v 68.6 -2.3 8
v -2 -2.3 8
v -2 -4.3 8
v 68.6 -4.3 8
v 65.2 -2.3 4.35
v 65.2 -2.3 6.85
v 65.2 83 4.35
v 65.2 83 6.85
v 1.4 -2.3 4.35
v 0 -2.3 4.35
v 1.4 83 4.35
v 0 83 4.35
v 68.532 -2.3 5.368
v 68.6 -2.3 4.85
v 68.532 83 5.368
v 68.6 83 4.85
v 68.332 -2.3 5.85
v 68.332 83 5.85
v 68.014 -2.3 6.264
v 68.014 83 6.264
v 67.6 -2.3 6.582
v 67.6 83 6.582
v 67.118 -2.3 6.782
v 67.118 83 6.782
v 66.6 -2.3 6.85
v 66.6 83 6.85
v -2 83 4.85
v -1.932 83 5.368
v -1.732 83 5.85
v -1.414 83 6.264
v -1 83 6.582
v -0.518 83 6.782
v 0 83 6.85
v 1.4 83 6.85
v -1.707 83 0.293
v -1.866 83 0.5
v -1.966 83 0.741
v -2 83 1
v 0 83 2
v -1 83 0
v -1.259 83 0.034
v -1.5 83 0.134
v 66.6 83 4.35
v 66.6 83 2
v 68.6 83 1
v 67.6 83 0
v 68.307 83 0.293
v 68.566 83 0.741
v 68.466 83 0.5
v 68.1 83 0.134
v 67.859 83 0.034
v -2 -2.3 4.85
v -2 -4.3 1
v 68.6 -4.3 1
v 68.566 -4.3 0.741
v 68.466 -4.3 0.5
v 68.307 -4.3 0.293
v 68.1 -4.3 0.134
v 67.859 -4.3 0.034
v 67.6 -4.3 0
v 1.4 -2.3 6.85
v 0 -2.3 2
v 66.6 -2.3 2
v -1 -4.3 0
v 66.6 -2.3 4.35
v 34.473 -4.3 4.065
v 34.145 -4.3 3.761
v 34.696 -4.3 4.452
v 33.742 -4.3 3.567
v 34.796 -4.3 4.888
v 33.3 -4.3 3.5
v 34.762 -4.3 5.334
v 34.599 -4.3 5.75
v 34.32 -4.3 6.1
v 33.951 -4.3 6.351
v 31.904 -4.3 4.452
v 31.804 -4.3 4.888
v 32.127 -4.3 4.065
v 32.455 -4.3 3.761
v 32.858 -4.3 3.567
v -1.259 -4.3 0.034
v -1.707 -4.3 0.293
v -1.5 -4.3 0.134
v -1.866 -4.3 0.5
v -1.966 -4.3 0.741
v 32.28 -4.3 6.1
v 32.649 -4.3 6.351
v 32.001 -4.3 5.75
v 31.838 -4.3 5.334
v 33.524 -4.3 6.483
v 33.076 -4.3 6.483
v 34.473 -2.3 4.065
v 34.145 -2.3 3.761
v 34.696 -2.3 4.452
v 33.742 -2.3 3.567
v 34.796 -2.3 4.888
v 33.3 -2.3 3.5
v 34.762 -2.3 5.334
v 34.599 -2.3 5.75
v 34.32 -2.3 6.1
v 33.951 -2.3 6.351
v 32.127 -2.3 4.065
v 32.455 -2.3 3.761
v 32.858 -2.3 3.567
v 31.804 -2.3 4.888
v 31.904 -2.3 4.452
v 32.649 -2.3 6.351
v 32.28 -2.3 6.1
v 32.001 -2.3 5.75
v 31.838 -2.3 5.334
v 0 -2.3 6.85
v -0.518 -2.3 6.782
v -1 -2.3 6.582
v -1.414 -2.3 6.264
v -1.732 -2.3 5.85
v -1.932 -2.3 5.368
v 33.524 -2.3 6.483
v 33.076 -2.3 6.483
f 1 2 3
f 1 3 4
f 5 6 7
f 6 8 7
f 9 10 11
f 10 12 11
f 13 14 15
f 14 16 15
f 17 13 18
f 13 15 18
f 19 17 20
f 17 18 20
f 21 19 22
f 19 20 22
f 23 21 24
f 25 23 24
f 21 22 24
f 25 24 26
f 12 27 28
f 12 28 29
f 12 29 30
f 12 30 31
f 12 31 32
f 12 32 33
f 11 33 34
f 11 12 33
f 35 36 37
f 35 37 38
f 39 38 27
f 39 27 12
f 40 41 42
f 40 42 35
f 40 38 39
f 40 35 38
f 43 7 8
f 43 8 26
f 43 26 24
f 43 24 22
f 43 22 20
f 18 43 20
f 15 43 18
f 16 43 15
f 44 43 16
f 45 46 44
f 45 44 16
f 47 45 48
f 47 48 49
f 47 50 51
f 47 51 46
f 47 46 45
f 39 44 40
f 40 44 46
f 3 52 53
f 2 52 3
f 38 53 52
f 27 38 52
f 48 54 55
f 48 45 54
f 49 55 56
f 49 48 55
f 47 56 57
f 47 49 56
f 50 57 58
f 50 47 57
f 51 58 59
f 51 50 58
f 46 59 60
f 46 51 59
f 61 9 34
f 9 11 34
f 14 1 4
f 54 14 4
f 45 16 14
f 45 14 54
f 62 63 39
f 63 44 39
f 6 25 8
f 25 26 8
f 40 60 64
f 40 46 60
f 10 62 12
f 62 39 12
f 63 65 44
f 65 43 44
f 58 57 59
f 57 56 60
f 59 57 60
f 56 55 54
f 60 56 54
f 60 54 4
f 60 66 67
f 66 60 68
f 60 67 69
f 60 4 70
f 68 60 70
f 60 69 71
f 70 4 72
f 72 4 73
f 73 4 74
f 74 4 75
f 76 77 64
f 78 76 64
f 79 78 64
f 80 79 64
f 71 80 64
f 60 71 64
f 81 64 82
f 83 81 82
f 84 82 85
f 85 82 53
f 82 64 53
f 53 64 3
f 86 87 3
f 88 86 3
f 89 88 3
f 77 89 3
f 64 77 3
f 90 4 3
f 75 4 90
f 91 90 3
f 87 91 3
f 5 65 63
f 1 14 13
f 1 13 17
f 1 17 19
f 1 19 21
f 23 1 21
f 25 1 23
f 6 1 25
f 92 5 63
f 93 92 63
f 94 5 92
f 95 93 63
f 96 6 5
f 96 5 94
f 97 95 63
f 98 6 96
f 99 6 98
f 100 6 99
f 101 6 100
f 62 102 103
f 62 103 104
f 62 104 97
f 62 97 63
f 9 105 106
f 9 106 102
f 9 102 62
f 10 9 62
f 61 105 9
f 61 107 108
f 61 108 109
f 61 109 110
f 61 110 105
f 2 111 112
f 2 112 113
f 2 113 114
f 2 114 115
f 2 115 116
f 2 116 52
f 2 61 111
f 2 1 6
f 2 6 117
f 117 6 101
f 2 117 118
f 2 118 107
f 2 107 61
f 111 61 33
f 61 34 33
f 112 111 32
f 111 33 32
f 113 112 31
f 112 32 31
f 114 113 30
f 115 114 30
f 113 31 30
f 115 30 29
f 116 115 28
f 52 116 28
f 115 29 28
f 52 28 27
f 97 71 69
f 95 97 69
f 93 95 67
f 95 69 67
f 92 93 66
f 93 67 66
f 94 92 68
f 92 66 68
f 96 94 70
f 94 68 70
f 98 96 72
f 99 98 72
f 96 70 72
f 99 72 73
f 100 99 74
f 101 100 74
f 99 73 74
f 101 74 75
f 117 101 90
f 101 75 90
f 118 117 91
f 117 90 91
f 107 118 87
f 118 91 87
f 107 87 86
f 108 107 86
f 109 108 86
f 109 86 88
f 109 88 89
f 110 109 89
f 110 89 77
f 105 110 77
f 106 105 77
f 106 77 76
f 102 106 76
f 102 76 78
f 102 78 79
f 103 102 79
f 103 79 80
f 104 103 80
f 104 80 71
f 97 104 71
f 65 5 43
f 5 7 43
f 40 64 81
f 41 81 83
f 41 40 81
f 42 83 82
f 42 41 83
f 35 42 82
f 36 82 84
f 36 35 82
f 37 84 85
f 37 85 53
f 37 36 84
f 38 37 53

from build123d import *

# Parameters (mm, degrees)
IZIM1_W                     = 66.6
IZIM1_H                     = 83
Y_KSEKLIK_EKSTR_ZYON1_DEPTH = 2
Y_KSEKLIK_EKSTR_ZYON2_DEPTH = 83
Y_KSEKLIK_EKSTR_ZYON3_DEPTH = 2.3
Y_KSEKLIK_EKSTR_ZYON4_DEPTH = 2
IZIM6_R                     = 1.5
KES_EKSTR_ZYON2_DEPTH       = 4


with BuildPart() as part:
    # Çizim1 → Yükseklik-Ekstrüzyon1 (new body)
    with BuildSketch(Plane.XY):
        with Locations((33.3, 41.5)):
            Rectangle(IZIM1_W, IZIM1_H)
    extrude(amount=Y_KSEKLIK_EKSTR_ZYON1_DEPTH)

    # Çizim2 → Yükseklik-Ekstrüzyon2 (add)
    with BuildSketch(Plane(origin=(0, 83, 0), x_dir=(1, 0, 0), z_dir=(0, 1, 0))):
        with BuildLine():
            Line((0, 0), (-1, 0))
            ThreePointArc((-1, 0), (-1.707106781, -0.292893219), (-2, -1))
            Line((-2, -1), (-2, -4.85))
            ThreePointArc((-2, -4.85), (-1.414213562, -6.264213562), (0, -6.85))
            Line((0, -6.85), (1.4, -6.85))
            Line((1.4, -6.85), (1.4, -4.35))
            Line((1.4, -4.35), (0, -4.35))
            Line((0, -4.35), (0, 0))
        make_face()
        with BuildLine():
            Line((65.2, -4.35), (65.2, -6.85))
            Line((65.2, -6.85), (66.6, -6.85))
            ThreePointArc((66.6, -6.85), (68.014213562, -6.264213562), (68.6, -4.85))
            Line((68.6, -4.85), (68.6, -1))
            ThreePointArc((68.6, -1), (68.307106781, -0.292893219), (67.6, 0))
            Line((67.6, 0), (66.6, 0))
            Line((66.6, 0), (66.6, -4.35))
            Line((66.6, -4.35), (65.2, -4.35))
        make_face()
    extrude(amount=-Y_KSEKLIK_EKSTR_ZYON2_DEPTH)

    # Çizim4 → Yükseklik-Ekstrüzyon3 (add)
    with BuildSketch(Plane.XZ):
        with BuildLine():
            Line((-1, 0), (67.6, 0))
            ThreePointArc((67.6, 0), (68.307106781, 0.292893219), (68.6, 1))
            Line((68.6, 1), (68.6, 4.85))
            ThreePointArc((68.6, 4.85), (68.014213562, 6.264213562), (66.6, 6.85))
            Line((66.6, 6.85), (65.2, 6.85))
            Line((65.2, 6.85), (65.2, 4.35))
            Line((65.2, 4.35), (66.6, 4.35))
            Line((66.6, 4.35), (66.6, 2))
            Line((66.6, 2), (0, 2))
            Line((0, 2), (0, 4.35))
            Line((0, 4.35), (1.4, 4.35))
            Line((1.4, 4.35), (1.4, 6.85))
            Line((1.4, 6.85), (0, 6.85))
            ThreePointArc((0, 6.85), (-1.414213562, 6.264213562), (-2, 4.85))
            Line((-2, 4.85), (-2, 1))
            ThreePointArc((-2, 1), (-1.707106781, 0.292893219), (-1, 0))
        make_face()
    extrude(amount=Y_KSEKLIK_EKSTR_ZYON3_DEPTH)

    # Çizim5 → Yükseklik-Ekstrüzyon4 (add)
    with BuildSketch(Plane.XZ.offset(2.3)):
        with BuildLine():
            Line((67.6, 0), (-1, 0))
            ThreePointArc((-1, 0), (-1.707106781, 0.292893219), (-2, 1))
            Line((-2, 1), (-2, 8))
            Line((-2, 8), (68.6, 8))
            Line((68.6, 8), (68.6, 1))
            ThreePointArc((68.6, 1), (68.307106781, 0.292893219), (67.6, 0))
        make_face()
    extrude(amount=Y_KSEKLIK_EKSTR_ZYON4_DEPTH)

    # Çizim6 → Kes-Ekstrüzyon2 (cut)
    with BuildSketch(Plane.XZ.offset(4.3)):
        with Locations(Location((33.3, 5, 0), (0, 0, 270))):
            Circle(IZIM6_R)
    extrude(amount=-KES_EKSTR_ZYON2_DEPTH, mode=Mode.SUBTRACT)


solid = part.part
